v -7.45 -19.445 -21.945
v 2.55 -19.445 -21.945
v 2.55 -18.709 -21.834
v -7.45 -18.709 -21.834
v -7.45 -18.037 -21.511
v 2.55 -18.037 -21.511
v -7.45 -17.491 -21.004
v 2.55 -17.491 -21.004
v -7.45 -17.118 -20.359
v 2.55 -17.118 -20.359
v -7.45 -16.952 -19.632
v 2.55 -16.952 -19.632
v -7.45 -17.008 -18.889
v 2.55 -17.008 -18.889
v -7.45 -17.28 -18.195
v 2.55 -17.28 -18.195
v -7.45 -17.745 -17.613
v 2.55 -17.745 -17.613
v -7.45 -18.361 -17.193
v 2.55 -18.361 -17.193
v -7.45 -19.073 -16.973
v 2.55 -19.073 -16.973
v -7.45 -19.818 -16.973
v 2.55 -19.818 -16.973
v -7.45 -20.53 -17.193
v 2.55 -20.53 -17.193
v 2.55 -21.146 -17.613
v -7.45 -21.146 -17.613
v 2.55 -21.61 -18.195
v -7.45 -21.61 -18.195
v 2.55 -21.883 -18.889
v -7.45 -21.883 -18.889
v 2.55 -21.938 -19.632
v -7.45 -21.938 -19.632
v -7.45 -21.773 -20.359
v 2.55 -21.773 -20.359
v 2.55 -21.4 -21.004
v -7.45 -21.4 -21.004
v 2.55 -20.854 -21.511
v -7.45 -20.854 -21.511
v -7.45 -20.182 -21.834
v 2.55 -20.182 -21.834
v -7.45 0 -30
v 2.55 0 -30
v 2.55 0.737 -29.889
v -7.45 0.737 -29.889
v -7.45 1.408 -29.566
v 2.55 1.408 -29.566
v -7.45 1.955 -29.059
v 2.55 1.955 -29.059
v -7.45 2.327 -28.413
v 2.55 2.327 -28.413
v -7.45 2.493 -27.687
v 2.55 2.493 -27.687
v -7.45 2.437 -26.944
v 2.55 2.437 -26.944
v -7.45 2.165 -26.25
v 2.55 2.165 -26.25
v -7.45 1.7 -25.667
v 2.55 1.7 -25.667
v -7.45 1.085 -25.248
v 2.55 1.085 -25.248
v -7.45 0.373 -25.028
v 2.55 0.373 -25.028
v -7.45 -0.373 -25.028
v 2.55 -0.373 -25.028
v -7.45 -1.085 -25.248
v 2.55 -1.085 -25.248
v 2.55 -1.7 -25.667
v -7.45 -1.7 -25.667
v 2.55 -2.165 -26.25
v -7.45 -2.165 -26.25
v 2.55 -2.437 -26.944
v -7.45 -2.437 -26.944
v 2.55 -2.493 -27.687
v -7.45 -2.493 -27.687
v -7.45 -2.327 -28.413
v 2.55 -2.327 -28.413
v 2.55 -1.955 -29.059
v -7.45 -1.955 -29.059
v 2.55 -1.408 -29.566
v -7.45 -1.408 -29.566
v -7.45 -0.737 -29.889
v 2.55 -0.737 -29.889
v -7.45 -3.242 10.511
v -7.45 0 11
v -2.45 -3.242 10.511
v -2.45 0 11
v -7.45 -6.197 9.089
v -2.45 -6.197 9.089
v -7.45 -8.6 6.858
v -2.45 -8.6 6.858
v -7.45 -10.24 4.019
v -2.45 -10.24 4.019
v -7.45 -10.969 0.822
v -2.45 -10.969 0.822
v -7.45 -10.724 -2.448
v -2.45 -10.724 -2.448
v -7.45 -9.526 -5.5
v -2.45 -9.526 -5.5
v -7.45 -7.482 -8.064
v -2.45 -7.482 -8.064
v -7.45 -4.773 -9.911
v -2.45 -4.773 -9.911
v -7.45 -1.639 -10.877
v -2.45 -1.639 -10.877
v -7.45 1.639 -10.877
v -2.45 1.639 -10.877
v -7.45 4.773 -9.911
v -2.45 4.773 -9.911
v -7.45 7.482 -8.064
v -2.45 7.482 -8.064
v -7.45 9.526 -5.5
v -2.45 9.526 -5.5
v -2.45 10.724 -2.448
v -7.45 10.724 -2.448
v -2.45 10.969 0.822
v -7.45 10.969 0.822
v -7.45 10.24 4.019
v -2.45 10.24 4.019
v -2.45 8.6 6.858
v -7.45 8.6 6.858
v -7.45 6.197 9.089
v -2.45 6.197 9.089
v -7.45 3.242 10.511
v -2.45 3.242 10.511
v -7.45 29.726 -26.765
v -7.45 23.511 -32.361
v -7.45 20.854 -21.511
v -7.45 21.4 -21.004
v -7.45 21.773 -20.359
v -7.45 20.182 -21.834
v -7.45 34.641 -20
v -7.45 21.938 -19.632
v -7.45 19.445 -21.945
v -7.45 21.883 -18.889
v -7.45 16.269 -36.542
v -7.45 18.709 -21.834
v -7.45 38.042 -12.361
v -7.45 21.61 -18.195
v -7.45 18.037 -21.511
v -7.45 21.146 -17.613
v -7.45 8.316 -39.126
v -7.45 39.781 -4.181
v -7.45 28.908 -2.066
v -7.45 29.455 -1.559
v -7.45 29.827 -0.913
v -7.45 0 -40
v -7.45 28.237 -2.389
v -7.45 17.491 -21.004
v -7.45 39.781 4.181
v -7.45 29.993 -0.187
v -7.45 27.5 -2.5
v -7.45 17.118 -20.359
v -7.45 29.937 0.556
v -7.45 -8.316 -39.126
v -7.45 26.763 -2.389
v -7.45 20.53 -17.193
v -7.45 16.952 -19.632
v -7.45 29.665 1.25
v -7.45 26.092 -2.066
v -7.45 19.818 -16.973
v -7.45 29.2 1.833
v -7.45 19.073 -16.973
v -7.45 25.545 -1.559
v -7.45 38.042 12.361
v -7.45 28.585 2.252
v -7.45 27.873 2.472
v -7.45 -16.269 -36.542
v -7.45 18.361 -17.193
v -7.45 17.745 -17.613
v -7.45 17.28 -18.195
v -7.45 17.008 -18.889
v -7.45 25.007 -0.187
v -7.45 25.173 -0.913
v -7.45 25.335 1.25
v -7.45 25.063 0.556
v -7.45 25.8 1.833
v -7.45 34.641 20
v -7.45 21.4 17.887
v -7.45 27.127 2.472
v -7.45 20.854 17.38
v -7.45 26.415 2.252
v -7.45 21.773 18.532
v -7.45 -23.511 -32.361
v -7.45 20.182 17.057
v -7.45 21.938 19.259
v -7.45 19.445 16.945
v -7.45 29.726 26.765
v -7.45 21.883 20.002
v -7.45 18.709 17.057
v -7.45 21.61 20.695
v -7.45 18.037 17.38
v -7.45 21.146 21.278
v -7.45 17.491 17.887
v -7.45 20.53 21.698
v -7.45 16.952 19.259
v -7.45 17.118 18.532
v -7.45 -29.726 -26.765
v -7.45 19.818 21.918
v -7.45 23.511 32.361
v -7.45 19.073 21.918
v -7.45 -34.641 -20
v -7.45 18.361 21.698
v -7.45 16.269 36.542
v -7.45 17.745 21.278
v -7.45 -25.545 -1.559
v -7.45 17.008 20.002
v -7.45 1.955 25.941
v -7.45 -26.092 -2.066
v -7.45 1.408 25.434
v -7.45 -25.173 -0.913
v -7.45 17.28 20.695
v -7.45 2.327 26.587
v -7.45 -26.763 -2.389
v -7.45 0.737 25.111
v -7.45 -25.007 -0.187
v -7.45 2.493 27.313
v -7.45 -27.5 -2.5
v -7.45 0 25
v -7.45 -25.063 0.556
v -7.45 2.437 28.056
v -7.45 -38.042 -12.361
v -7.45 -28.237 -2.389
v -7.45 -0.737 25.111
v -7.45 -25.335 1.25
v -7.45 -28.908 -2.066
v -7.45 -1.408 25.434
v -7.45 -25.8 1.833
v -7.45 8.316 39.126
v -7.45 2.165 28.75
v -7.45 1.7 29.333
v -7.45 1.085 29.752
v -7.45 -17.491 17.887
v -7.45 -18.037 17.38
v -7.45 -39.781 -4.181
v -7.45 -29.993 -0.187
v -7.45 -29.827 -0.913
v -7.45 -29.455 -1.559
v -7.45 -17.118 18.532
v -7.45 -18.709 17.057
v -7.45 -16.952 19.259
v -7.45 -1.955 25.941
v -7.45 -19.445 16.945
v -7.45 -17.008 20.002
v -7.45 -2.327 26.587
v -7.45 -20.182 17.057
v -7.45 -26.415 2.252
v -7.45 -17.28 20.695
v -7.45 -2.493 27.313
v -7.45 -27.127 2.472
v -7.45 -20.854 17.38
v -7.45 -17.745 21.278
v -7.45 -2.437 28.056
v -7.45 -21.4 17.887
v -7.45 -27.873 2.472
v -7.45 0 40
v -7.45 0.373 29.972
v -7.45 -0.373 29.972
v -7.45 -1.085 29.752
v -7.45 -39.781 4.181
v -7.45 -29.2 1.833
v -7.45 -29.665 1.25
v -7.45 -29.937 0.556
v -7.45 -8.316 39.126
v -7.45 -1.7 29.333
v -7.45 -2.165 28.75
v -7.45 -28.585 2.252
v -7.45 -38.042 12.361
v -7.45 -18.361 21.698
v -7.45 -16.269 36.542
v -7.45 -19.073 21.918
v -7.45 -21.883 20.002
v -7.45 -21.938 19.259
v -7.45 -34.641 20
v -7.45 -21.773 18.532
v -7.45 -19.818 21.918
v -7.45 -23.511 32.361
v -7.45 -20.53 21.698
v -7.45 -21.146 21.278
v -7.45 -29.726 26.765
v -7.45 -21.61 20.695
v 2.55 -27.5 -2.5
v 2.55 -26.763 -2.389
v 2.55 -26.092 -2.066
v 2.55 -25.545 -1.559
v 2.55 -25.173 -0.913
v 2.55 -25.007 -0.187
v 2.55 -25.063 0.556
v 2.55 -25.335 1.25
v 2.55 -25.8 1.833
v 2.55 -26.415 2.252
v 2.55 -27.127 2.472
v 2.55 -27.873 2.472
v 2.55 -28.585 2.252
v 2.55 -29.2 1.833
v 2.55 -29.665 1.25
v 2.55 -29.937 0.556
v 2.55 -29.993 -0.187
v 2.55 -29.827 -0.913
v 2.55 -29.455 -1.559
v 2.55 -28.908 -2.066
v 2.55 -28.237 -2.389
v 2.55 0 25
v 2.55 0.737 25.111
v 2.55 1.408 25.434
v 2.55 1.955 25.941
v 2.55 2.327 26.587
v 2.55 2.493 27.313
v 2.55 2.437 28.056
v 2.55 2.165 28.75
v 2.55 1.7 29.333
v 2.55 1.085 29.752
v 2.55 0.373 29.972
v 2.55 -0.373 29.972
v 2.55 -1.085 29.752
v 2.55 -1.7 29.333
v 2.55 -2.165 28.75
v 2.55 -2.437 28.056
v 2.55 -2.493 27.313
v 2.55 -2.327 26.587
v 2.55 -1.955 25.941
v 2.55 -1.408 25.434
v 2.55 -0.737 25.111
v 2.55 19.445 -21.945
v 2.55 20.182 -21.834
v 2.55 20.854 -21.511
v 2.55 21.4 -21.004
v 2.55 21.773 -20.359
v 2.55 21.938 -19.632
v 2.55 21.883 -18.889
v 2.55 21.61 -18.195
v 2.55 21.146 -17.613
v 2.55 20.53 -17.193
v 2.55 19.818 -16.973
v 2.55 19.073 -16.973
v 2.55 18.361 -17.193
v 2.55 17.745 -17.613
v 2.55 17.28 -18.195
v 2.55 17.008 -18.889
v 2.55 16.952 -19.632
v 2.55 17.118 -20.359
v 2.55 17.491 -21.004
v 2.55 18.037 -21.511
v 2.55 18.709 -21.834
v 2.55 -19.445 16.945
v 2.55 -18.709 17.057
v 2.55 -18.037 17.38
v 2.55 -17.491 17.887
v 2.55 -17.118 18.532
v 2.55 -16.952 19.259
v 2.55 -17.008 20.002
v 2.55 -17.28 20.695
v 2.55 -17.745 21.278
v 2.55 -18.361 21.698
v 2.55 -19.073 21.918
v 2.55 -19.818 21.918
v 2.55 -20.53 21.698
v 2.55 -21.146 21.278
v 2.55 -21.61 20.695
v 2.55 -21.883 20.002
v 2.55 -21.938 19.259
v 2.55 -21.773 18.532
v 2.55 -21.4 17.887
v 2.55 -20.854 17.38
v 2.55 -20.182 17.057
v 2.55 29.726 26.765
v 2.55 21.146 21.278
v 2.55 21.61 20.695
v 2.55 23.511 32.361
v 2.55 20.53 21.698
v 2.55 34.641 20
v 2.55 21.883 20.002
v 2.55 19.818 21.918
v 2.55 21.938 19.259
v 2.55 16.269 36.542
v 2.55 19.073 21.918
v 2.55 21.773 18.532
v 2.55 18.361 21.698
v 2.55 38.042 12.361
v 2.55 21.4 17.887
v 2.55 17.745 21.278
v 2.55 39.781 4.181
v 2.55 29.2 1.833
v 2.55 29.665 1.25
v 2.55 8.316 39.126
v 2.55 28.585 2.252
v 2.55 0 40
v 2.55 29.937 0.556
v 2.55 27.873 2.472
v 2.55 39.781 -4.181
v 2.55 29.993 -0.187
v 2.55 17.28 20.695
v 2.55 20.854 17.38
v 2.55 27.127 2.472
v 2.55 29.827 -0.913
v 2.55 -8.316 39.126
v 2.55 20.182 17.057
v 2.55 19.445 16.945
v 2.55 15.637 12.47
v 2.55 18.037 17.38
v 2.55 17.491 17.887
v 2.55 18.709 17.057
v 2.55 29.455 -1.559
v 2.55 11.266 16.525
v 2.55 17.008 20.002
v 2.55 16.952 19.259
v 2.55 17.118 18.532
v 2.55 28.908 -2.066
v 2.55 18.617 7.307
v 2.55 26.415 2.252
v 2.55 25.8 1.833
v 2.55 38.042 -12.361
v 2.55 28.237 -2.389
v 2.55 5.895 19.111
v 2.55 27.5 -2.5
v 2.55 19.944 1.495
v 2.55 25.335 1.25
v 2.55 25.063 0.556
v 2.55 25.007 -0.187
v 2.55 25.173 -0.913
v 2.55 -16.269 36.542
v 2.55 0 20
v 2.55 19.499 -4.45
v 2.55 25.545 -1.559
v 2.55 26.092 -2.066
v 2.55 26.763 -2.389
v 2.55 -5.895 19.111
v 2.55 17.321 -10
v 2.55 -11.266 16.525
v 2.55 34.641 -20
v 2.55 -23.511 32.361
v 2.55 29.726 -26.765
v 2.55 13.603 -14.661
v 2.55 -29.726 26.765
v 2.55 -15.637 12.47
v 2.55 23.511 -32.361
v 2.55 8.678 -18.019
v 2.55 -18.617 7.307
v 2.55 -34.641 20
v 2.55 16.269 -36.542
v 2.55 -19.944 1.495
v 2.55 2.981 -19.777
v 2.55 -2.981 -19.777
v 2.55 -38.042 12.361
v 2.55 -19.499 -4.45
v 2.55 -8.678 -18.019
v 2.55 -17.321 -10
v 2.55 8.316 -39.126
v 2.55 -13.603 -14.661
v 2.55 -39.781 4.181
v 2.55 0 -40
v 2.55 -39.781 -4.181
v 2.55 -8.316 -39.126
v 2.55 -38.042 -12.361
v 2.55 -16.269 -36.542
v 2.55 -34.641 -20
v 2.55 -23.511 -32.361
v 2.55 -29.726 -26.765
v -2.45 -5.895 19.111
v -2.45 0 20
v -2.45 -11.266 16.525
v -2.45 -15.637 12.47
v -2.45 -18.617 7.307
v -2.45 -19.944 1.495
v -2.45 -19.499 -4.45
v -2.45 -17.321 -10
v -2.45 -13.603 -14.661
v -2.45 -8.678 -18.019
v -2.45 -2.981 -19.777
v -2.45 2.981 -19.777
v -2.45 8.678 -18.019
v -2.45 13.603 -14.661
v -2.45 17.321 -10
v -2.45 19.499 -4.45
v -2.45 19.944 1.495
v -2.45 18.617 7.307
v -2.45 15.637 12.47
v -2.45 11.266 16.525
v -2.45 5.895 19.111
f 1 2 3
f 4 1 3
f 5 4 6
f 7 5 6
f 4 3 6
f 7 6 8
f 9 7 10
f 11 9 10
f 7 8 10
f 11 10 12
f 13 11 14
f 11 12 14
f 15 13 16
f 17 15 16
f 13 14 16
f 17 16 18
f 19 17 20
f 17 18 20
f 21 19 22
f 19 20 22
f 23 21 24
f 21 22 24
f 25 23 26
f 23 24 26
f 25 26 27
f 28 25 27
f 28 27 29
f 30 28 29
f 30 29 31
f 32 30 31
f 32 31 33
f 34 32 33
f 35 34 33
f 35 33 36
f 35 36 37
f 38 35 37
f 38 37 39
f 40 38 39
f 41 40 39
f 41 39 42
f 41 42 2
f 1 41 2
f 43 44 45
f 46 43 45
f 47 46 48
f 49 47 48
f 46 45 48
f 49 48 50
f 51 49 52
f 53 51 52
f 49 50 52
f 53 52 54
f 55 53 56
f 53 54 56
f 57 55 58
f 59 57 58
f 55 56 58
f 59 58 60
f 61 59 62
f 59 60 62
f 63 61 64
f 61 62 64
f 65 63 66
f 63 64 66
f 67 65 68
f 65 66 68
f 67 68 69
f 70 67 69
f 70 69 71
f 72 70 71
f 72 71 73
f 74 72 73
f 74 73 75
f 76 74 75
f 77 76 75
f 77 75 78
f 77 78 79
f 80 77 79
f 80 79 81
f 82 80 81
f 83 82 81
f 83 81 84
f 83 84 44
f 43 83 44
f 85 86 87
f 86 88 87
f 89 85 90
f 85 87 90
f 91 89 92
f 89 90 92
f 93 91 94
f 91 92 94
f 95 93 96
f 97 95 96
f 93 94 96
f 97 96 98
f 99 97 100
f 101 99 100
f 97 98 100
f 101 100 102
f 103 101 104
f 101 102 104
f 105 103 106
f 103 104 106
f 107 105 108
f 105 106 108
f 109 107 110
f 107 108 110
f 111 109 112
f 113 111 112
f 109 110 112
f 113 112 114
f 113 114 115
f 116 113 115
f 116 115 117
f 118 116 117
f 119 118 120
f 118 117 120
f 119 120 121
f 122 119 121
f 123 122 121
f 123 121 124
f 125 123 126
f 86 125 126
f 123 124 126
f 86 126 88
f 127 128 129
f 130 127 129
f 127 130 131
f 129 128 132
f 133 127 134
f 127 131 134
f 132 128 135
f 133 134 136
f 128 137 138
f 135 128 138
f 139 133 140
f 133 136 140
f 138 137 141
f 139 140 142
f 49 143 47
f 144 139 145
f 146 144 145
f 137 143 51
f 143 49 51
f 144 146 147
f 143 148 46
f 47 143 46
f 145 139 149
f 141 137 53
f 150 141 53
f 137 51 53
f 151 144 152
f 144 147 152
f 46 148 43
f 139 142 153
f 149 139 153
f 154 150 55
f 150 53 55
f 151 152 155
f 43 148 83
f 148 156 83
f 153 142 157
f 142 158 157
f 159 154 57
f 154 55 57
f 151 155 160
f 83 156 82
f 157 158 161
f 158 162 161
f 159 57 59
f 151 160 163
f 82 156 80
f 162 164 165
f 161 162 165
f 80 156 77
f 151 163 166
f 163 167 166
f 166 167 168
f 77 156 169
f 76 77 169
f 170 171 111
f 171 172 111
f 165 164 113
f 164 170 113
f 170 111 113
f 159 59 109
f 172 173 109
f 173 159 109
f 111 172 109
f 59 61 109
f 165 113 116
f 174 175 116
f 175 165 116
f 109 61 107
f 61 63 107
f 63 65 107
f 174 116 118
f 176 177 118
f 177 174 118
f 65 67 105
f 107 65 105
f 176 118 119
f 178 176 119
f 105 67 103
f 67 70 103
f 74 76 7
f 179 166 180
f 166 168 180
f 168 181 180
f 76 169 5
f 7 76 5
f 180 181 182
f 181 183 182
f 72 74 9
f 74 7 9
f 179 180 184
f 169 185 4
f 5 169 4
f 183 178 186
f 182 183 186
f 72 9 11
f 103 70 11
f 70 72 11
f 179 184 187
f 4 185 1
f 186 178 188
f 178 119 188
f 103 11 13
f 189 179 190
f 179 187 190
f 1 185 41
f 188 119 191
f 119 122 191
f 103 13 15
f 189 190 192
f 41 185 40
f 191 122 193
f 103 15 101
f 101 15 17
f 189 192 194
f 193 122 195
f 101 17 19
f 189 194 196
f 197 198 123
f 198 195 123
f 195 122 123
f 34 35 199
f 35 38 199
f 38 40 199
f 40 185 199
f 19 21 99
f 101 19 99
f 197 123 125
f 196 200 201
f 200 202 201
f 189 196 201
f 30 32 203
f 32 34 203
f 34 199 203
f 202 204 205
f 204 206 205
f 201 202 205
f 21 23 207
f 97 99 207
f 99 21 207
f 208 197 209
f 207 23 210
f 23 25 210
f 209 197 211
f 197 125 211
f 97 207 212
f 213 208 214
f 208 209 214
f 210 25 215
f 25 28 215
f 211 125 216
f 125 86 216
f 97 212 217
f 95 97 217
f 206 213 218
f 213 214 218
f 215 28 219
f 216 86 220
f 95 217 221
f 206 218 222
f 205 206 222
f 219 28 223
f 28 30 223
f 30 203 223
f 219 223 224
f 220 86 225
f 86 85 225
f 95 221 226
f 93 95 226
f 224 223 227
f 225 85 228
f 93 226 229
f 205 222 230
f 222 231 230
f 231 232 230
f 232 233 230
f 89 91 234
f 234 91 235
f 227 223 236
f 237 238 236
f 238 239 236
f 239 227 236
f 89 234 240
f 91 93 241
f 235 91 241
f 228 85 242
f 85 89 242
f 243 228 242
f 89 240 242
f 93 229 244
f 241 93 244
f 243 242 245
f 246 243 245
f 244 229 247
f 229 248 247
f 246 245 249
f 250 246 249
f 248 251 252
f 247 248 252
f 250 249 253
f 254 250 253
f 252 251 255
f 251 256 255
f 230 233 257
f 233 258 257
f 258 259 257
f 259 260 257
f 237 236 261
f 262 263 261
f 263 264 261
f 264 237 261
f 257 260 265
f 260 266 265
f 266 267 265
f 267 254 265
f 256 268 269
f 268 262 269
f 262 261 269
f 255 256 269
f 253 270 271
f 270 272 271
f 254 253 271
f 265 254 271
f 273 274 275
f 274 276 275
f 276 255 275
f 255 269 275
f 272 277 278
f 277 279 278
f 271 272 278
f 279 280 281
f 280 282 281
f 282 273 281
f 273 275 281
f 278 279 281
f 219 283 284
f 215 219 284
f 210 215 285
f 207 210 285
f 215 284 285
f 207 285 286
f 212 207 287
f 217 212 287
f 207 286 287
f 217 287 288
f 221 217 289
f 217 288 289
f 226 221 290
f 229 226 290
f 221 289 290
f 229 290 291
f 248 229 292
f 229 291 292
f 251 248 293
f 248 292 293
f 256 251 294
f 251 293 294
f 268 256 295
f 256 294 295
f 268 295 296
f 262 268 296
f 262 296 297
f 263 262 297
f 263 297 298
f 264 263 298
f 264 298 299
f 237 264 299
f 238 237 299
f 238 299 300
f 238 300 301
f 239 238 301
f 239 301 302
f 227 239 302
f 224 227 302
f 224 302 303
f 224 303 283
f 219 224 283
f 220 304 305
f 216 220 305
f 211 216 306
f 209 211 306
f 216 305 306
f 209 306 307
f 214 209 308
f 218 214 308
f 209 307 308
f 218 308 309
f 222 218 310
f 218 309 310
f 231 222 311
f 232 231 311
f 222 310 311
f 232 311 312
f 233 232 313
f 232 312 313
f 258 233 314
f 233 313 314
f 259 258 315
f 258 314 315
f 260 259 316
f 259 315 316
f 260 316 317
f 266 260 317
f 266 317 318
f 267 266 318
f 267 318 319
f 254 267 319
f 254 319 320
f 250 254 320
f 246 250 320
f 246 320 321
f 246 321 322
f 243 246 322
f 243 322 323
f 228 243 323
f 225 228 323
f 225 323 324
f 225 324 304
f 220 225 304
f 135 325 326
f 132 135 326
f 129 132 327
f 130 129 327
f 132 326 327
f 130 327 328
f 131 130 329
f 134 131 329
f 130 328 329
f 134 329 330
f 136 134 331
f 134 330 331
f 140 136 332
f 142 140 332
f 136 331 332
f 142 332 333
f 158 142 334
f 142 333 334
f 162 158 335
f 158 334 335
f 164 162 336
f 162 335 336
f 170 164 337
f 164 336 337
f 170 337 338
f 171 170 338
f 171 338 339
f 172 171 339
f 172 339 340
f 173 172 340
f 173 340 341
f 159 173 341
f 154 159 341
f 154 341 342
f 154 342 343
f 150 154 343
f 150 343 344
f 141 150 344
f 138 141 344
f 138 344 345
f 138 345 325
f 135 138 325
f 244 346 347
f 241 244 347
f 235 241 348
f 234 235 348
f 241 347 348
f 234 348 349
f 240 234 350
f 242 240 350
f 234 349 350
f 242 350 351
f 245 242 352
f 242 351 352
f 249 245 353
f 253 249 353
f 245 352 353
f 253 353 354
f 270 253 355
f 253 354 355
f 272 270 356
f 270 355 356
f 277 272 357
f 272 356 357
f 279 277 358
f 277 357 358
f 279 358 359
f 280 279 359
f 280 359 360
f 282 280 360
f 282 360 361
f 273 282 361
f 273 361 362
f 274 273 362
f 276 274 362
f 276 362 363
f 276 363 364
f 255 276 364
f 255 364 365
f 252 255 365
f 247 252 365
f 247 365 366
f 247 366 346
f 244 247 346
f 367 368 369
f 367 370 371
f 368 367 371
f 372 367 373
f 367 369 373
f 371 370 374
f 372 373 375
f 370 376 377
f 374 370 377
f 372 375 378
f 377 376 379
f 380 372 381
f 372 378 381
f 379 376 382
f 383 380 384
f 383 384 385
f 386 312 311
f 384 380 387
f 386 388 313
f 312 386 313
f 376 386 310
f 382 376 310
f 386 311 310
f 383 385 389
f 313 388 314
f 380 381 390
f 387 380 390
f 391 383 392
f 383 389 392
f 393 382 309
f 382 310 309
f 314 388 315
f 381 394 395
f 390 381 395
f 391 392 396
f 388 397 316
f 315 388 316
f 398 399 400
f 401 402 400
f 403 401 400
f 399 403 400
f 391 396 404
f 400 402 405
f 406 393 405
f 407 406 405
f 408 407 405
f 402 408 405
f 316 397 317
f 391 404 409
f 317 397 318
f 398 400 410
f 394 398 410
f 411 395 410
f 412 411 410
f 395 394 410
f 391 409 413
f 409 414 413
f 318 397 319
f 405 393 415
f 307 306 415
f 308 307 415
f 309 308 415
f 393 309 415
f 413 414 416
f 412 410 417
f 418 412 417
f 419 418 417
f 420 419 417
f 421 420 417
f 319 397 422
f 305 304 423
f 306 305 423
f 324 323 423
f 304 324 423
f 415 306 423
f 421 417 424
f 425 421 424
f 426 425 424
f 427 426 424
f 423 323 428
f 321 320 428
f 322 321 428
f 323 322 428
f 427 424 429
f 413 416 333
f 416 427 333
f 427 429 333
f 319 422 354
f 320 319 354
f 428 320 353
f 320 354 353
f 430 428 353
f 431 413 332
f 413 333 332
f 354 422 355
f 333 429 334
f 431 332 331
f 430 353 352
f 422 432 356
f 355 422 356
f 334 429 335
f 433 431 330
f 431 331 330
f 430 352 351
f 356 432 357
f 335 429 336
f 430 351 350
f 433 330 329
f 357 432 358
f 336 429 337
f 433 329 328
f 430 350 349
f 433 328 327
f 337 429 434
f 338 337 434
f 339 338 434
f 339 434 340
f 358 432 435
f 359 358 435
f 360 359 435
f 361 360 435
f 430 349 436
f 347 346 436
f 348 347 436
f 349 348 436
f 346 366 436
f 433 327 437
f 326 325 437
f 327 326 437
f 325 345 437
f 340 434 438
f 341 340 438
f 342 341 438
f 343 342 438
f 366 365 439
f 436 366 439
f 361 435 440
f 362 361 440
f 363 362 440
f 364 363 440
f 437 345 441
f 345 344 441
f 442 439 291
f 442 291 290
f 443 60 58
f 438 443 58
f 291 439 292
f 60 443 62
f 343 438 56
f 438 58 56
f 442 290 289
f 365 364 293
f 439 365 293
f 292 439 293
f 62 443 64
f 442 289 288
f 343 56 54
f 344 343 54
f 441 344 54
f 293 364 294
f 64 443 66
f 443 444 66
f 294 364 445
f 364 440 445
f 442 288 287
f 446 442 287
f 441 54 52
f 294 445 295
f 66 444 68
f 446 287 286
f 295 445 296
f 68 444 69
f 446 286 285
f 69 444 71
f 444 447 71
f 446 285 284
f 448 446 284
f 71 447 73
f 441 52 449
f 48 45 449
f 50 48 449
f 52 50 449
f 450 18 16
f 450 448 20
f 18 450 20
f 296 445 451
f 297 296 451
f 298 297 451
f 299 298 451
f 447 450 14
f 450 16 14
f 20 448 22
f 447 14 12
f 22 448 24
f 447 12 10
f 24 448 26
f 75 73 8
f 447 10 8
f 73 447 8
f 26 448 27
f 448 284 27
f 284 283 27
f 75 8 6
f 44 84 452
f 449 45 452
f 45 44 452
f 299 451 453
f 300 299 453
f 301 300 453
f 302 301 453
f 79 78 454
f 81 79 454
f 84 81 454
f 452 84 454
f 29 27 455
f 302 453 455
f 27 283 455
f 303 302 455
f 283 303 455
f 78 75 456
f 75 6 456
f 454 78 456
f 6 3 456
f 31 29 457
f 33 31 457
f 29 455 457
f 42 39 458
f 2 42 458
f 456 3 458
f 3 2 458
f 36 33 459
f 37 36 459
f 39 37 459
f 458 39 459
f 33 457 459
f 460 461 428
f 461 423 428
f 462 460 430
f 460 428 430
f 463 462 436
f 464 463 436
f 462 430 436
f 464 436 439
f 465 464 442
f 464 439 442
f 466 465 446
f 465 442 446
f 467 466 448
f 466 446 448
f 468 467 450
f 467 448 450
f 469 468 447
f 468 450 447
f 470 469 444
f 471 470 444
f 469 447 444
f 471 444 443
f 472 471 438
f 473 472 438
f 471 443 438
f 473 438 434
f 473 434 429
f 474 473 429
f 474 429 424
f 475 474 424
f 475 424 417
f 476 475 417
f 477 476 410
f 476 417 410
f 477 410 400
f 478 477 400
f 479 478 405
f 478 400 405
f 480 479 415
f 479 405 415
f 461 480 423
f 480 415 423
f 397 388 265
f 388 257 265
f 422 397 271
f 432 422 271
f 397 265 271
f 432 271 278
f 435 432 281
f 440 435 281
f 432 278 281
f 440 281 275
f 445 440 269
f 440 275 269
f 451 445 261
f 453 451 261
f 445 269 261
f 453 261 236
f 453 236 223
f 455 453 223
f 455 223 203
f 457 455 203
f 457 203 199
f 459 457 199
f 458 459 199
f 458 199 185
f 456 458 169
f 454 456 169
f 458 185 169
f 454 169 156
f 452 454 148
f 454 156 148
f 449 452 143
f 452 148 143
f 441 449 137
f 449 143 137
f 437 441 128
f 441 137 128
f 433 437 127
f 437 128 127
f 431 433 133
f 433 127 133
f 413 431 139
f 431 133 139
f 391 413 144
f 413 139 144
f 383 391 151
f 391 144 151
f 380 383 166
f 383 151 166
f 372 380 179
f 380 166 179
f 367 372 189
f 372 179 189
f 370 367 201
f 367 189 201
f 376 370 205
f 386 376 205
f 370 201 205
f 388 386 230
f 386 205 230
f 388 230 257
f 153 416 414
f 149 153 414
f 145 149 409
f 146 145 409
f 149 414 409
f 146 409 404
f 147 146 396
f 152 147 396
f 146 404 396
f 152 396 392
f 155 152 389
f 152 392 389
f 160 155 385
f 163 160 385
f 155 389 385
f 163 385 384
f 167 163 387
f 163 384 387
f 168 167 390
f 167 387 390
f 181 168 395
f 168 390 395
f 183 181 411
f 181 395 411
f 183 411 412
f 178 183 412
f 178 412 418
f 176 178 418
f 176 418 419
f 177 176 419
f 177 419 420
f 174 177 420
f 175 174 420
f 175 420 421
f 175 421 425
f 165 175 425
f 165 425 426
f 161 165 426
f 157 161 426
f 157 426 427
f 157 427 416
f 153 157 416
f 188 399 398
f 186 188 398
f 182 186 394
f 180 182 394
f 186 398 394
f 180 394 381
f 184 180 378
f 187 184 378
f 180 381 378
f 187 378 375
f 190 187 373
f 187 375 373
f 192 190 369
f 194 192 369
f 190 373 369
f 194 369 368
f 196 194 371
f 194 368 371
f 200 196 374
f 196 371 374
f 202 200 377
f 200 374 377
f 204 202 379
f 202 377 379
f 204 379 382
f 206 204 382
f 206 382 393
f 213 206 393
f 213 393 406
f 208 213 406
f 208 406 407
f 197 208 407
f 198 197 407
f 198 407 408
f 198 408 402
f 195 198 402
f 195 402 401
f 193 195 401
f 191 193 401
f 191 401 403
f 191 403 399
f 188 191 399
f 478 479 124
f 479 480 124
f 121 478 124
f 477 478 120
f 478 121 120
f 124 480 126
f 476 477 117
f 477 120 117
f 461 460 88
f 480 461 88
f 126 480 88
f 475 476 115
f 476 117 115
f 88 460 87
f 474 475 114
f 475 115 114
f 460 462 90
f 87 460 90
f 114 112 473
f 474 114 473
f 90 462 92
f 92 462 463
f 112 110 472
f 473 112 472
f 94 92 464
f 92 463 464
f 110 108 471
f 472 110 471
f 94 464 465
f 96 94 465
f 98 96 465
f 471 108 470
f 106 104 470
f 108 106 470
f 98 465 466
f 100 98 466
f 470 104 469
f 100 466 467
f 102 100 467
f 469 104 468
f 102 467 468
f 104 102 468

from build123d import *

# Parameters (mm, degrees)
SKETCH2_R          = 2.5
CUT_EXTRUDE1_DEPTH = 58.445626465


with BuildPart() as part:
    # Sketch1 → Revolve1 (revolve)
    with BuildSketch(Plane.XY, mode=Mode.PRIVATE) as revolve1_sk:
        Polygon((2.55, 20), (2.55, 40), (-7.45, 40), (-7.45, 11), (-2.45, 11), (-2.45, 20), align=None)
    revolve(revolve1_sk.sketch.rotate(Axis((-7.45, 0, 0), (1, 0, 0)), 90), axis=Axis((-7.45, 0, 0), (1, 0, 0)))

    # Sketch2 → Cut-Extrude1 (cut, through all)
    with BuildSketch(Plane(origin=(2.55, 0, 0), x_dir=(0, 0, -1), z_dir=(1, 0, 0))):
        with Locations((-19.445436483, -19.445436483)):
            Circle(SKETCH2_R)
        with Locations((-27.5, 0)):
            Circle(SKETCH2_R)
        with Locations((-19.445436483, 19.445436483)):
            Circle(SKETCH2_R)
        with Locations((0, 27.5)):
            Circle(SKETCH2_R)
        with Locations((19.445436483, 19.445436483)):
            Circle(SKETCH2_R)
        with Locations((27.5, 0)):
            Circle(SKETCH2_R)
        with Locations((19.445436483, -19.445436483)):
            Circle(SKETCH2_R)
        with Locations((0, -27.5)):
            Circle(SKETCH2_R)
    extrude(amount=-CUT_EXTRUDE1_DEPTH, mode=Mode.SUBTRACT)


solid = part.part
